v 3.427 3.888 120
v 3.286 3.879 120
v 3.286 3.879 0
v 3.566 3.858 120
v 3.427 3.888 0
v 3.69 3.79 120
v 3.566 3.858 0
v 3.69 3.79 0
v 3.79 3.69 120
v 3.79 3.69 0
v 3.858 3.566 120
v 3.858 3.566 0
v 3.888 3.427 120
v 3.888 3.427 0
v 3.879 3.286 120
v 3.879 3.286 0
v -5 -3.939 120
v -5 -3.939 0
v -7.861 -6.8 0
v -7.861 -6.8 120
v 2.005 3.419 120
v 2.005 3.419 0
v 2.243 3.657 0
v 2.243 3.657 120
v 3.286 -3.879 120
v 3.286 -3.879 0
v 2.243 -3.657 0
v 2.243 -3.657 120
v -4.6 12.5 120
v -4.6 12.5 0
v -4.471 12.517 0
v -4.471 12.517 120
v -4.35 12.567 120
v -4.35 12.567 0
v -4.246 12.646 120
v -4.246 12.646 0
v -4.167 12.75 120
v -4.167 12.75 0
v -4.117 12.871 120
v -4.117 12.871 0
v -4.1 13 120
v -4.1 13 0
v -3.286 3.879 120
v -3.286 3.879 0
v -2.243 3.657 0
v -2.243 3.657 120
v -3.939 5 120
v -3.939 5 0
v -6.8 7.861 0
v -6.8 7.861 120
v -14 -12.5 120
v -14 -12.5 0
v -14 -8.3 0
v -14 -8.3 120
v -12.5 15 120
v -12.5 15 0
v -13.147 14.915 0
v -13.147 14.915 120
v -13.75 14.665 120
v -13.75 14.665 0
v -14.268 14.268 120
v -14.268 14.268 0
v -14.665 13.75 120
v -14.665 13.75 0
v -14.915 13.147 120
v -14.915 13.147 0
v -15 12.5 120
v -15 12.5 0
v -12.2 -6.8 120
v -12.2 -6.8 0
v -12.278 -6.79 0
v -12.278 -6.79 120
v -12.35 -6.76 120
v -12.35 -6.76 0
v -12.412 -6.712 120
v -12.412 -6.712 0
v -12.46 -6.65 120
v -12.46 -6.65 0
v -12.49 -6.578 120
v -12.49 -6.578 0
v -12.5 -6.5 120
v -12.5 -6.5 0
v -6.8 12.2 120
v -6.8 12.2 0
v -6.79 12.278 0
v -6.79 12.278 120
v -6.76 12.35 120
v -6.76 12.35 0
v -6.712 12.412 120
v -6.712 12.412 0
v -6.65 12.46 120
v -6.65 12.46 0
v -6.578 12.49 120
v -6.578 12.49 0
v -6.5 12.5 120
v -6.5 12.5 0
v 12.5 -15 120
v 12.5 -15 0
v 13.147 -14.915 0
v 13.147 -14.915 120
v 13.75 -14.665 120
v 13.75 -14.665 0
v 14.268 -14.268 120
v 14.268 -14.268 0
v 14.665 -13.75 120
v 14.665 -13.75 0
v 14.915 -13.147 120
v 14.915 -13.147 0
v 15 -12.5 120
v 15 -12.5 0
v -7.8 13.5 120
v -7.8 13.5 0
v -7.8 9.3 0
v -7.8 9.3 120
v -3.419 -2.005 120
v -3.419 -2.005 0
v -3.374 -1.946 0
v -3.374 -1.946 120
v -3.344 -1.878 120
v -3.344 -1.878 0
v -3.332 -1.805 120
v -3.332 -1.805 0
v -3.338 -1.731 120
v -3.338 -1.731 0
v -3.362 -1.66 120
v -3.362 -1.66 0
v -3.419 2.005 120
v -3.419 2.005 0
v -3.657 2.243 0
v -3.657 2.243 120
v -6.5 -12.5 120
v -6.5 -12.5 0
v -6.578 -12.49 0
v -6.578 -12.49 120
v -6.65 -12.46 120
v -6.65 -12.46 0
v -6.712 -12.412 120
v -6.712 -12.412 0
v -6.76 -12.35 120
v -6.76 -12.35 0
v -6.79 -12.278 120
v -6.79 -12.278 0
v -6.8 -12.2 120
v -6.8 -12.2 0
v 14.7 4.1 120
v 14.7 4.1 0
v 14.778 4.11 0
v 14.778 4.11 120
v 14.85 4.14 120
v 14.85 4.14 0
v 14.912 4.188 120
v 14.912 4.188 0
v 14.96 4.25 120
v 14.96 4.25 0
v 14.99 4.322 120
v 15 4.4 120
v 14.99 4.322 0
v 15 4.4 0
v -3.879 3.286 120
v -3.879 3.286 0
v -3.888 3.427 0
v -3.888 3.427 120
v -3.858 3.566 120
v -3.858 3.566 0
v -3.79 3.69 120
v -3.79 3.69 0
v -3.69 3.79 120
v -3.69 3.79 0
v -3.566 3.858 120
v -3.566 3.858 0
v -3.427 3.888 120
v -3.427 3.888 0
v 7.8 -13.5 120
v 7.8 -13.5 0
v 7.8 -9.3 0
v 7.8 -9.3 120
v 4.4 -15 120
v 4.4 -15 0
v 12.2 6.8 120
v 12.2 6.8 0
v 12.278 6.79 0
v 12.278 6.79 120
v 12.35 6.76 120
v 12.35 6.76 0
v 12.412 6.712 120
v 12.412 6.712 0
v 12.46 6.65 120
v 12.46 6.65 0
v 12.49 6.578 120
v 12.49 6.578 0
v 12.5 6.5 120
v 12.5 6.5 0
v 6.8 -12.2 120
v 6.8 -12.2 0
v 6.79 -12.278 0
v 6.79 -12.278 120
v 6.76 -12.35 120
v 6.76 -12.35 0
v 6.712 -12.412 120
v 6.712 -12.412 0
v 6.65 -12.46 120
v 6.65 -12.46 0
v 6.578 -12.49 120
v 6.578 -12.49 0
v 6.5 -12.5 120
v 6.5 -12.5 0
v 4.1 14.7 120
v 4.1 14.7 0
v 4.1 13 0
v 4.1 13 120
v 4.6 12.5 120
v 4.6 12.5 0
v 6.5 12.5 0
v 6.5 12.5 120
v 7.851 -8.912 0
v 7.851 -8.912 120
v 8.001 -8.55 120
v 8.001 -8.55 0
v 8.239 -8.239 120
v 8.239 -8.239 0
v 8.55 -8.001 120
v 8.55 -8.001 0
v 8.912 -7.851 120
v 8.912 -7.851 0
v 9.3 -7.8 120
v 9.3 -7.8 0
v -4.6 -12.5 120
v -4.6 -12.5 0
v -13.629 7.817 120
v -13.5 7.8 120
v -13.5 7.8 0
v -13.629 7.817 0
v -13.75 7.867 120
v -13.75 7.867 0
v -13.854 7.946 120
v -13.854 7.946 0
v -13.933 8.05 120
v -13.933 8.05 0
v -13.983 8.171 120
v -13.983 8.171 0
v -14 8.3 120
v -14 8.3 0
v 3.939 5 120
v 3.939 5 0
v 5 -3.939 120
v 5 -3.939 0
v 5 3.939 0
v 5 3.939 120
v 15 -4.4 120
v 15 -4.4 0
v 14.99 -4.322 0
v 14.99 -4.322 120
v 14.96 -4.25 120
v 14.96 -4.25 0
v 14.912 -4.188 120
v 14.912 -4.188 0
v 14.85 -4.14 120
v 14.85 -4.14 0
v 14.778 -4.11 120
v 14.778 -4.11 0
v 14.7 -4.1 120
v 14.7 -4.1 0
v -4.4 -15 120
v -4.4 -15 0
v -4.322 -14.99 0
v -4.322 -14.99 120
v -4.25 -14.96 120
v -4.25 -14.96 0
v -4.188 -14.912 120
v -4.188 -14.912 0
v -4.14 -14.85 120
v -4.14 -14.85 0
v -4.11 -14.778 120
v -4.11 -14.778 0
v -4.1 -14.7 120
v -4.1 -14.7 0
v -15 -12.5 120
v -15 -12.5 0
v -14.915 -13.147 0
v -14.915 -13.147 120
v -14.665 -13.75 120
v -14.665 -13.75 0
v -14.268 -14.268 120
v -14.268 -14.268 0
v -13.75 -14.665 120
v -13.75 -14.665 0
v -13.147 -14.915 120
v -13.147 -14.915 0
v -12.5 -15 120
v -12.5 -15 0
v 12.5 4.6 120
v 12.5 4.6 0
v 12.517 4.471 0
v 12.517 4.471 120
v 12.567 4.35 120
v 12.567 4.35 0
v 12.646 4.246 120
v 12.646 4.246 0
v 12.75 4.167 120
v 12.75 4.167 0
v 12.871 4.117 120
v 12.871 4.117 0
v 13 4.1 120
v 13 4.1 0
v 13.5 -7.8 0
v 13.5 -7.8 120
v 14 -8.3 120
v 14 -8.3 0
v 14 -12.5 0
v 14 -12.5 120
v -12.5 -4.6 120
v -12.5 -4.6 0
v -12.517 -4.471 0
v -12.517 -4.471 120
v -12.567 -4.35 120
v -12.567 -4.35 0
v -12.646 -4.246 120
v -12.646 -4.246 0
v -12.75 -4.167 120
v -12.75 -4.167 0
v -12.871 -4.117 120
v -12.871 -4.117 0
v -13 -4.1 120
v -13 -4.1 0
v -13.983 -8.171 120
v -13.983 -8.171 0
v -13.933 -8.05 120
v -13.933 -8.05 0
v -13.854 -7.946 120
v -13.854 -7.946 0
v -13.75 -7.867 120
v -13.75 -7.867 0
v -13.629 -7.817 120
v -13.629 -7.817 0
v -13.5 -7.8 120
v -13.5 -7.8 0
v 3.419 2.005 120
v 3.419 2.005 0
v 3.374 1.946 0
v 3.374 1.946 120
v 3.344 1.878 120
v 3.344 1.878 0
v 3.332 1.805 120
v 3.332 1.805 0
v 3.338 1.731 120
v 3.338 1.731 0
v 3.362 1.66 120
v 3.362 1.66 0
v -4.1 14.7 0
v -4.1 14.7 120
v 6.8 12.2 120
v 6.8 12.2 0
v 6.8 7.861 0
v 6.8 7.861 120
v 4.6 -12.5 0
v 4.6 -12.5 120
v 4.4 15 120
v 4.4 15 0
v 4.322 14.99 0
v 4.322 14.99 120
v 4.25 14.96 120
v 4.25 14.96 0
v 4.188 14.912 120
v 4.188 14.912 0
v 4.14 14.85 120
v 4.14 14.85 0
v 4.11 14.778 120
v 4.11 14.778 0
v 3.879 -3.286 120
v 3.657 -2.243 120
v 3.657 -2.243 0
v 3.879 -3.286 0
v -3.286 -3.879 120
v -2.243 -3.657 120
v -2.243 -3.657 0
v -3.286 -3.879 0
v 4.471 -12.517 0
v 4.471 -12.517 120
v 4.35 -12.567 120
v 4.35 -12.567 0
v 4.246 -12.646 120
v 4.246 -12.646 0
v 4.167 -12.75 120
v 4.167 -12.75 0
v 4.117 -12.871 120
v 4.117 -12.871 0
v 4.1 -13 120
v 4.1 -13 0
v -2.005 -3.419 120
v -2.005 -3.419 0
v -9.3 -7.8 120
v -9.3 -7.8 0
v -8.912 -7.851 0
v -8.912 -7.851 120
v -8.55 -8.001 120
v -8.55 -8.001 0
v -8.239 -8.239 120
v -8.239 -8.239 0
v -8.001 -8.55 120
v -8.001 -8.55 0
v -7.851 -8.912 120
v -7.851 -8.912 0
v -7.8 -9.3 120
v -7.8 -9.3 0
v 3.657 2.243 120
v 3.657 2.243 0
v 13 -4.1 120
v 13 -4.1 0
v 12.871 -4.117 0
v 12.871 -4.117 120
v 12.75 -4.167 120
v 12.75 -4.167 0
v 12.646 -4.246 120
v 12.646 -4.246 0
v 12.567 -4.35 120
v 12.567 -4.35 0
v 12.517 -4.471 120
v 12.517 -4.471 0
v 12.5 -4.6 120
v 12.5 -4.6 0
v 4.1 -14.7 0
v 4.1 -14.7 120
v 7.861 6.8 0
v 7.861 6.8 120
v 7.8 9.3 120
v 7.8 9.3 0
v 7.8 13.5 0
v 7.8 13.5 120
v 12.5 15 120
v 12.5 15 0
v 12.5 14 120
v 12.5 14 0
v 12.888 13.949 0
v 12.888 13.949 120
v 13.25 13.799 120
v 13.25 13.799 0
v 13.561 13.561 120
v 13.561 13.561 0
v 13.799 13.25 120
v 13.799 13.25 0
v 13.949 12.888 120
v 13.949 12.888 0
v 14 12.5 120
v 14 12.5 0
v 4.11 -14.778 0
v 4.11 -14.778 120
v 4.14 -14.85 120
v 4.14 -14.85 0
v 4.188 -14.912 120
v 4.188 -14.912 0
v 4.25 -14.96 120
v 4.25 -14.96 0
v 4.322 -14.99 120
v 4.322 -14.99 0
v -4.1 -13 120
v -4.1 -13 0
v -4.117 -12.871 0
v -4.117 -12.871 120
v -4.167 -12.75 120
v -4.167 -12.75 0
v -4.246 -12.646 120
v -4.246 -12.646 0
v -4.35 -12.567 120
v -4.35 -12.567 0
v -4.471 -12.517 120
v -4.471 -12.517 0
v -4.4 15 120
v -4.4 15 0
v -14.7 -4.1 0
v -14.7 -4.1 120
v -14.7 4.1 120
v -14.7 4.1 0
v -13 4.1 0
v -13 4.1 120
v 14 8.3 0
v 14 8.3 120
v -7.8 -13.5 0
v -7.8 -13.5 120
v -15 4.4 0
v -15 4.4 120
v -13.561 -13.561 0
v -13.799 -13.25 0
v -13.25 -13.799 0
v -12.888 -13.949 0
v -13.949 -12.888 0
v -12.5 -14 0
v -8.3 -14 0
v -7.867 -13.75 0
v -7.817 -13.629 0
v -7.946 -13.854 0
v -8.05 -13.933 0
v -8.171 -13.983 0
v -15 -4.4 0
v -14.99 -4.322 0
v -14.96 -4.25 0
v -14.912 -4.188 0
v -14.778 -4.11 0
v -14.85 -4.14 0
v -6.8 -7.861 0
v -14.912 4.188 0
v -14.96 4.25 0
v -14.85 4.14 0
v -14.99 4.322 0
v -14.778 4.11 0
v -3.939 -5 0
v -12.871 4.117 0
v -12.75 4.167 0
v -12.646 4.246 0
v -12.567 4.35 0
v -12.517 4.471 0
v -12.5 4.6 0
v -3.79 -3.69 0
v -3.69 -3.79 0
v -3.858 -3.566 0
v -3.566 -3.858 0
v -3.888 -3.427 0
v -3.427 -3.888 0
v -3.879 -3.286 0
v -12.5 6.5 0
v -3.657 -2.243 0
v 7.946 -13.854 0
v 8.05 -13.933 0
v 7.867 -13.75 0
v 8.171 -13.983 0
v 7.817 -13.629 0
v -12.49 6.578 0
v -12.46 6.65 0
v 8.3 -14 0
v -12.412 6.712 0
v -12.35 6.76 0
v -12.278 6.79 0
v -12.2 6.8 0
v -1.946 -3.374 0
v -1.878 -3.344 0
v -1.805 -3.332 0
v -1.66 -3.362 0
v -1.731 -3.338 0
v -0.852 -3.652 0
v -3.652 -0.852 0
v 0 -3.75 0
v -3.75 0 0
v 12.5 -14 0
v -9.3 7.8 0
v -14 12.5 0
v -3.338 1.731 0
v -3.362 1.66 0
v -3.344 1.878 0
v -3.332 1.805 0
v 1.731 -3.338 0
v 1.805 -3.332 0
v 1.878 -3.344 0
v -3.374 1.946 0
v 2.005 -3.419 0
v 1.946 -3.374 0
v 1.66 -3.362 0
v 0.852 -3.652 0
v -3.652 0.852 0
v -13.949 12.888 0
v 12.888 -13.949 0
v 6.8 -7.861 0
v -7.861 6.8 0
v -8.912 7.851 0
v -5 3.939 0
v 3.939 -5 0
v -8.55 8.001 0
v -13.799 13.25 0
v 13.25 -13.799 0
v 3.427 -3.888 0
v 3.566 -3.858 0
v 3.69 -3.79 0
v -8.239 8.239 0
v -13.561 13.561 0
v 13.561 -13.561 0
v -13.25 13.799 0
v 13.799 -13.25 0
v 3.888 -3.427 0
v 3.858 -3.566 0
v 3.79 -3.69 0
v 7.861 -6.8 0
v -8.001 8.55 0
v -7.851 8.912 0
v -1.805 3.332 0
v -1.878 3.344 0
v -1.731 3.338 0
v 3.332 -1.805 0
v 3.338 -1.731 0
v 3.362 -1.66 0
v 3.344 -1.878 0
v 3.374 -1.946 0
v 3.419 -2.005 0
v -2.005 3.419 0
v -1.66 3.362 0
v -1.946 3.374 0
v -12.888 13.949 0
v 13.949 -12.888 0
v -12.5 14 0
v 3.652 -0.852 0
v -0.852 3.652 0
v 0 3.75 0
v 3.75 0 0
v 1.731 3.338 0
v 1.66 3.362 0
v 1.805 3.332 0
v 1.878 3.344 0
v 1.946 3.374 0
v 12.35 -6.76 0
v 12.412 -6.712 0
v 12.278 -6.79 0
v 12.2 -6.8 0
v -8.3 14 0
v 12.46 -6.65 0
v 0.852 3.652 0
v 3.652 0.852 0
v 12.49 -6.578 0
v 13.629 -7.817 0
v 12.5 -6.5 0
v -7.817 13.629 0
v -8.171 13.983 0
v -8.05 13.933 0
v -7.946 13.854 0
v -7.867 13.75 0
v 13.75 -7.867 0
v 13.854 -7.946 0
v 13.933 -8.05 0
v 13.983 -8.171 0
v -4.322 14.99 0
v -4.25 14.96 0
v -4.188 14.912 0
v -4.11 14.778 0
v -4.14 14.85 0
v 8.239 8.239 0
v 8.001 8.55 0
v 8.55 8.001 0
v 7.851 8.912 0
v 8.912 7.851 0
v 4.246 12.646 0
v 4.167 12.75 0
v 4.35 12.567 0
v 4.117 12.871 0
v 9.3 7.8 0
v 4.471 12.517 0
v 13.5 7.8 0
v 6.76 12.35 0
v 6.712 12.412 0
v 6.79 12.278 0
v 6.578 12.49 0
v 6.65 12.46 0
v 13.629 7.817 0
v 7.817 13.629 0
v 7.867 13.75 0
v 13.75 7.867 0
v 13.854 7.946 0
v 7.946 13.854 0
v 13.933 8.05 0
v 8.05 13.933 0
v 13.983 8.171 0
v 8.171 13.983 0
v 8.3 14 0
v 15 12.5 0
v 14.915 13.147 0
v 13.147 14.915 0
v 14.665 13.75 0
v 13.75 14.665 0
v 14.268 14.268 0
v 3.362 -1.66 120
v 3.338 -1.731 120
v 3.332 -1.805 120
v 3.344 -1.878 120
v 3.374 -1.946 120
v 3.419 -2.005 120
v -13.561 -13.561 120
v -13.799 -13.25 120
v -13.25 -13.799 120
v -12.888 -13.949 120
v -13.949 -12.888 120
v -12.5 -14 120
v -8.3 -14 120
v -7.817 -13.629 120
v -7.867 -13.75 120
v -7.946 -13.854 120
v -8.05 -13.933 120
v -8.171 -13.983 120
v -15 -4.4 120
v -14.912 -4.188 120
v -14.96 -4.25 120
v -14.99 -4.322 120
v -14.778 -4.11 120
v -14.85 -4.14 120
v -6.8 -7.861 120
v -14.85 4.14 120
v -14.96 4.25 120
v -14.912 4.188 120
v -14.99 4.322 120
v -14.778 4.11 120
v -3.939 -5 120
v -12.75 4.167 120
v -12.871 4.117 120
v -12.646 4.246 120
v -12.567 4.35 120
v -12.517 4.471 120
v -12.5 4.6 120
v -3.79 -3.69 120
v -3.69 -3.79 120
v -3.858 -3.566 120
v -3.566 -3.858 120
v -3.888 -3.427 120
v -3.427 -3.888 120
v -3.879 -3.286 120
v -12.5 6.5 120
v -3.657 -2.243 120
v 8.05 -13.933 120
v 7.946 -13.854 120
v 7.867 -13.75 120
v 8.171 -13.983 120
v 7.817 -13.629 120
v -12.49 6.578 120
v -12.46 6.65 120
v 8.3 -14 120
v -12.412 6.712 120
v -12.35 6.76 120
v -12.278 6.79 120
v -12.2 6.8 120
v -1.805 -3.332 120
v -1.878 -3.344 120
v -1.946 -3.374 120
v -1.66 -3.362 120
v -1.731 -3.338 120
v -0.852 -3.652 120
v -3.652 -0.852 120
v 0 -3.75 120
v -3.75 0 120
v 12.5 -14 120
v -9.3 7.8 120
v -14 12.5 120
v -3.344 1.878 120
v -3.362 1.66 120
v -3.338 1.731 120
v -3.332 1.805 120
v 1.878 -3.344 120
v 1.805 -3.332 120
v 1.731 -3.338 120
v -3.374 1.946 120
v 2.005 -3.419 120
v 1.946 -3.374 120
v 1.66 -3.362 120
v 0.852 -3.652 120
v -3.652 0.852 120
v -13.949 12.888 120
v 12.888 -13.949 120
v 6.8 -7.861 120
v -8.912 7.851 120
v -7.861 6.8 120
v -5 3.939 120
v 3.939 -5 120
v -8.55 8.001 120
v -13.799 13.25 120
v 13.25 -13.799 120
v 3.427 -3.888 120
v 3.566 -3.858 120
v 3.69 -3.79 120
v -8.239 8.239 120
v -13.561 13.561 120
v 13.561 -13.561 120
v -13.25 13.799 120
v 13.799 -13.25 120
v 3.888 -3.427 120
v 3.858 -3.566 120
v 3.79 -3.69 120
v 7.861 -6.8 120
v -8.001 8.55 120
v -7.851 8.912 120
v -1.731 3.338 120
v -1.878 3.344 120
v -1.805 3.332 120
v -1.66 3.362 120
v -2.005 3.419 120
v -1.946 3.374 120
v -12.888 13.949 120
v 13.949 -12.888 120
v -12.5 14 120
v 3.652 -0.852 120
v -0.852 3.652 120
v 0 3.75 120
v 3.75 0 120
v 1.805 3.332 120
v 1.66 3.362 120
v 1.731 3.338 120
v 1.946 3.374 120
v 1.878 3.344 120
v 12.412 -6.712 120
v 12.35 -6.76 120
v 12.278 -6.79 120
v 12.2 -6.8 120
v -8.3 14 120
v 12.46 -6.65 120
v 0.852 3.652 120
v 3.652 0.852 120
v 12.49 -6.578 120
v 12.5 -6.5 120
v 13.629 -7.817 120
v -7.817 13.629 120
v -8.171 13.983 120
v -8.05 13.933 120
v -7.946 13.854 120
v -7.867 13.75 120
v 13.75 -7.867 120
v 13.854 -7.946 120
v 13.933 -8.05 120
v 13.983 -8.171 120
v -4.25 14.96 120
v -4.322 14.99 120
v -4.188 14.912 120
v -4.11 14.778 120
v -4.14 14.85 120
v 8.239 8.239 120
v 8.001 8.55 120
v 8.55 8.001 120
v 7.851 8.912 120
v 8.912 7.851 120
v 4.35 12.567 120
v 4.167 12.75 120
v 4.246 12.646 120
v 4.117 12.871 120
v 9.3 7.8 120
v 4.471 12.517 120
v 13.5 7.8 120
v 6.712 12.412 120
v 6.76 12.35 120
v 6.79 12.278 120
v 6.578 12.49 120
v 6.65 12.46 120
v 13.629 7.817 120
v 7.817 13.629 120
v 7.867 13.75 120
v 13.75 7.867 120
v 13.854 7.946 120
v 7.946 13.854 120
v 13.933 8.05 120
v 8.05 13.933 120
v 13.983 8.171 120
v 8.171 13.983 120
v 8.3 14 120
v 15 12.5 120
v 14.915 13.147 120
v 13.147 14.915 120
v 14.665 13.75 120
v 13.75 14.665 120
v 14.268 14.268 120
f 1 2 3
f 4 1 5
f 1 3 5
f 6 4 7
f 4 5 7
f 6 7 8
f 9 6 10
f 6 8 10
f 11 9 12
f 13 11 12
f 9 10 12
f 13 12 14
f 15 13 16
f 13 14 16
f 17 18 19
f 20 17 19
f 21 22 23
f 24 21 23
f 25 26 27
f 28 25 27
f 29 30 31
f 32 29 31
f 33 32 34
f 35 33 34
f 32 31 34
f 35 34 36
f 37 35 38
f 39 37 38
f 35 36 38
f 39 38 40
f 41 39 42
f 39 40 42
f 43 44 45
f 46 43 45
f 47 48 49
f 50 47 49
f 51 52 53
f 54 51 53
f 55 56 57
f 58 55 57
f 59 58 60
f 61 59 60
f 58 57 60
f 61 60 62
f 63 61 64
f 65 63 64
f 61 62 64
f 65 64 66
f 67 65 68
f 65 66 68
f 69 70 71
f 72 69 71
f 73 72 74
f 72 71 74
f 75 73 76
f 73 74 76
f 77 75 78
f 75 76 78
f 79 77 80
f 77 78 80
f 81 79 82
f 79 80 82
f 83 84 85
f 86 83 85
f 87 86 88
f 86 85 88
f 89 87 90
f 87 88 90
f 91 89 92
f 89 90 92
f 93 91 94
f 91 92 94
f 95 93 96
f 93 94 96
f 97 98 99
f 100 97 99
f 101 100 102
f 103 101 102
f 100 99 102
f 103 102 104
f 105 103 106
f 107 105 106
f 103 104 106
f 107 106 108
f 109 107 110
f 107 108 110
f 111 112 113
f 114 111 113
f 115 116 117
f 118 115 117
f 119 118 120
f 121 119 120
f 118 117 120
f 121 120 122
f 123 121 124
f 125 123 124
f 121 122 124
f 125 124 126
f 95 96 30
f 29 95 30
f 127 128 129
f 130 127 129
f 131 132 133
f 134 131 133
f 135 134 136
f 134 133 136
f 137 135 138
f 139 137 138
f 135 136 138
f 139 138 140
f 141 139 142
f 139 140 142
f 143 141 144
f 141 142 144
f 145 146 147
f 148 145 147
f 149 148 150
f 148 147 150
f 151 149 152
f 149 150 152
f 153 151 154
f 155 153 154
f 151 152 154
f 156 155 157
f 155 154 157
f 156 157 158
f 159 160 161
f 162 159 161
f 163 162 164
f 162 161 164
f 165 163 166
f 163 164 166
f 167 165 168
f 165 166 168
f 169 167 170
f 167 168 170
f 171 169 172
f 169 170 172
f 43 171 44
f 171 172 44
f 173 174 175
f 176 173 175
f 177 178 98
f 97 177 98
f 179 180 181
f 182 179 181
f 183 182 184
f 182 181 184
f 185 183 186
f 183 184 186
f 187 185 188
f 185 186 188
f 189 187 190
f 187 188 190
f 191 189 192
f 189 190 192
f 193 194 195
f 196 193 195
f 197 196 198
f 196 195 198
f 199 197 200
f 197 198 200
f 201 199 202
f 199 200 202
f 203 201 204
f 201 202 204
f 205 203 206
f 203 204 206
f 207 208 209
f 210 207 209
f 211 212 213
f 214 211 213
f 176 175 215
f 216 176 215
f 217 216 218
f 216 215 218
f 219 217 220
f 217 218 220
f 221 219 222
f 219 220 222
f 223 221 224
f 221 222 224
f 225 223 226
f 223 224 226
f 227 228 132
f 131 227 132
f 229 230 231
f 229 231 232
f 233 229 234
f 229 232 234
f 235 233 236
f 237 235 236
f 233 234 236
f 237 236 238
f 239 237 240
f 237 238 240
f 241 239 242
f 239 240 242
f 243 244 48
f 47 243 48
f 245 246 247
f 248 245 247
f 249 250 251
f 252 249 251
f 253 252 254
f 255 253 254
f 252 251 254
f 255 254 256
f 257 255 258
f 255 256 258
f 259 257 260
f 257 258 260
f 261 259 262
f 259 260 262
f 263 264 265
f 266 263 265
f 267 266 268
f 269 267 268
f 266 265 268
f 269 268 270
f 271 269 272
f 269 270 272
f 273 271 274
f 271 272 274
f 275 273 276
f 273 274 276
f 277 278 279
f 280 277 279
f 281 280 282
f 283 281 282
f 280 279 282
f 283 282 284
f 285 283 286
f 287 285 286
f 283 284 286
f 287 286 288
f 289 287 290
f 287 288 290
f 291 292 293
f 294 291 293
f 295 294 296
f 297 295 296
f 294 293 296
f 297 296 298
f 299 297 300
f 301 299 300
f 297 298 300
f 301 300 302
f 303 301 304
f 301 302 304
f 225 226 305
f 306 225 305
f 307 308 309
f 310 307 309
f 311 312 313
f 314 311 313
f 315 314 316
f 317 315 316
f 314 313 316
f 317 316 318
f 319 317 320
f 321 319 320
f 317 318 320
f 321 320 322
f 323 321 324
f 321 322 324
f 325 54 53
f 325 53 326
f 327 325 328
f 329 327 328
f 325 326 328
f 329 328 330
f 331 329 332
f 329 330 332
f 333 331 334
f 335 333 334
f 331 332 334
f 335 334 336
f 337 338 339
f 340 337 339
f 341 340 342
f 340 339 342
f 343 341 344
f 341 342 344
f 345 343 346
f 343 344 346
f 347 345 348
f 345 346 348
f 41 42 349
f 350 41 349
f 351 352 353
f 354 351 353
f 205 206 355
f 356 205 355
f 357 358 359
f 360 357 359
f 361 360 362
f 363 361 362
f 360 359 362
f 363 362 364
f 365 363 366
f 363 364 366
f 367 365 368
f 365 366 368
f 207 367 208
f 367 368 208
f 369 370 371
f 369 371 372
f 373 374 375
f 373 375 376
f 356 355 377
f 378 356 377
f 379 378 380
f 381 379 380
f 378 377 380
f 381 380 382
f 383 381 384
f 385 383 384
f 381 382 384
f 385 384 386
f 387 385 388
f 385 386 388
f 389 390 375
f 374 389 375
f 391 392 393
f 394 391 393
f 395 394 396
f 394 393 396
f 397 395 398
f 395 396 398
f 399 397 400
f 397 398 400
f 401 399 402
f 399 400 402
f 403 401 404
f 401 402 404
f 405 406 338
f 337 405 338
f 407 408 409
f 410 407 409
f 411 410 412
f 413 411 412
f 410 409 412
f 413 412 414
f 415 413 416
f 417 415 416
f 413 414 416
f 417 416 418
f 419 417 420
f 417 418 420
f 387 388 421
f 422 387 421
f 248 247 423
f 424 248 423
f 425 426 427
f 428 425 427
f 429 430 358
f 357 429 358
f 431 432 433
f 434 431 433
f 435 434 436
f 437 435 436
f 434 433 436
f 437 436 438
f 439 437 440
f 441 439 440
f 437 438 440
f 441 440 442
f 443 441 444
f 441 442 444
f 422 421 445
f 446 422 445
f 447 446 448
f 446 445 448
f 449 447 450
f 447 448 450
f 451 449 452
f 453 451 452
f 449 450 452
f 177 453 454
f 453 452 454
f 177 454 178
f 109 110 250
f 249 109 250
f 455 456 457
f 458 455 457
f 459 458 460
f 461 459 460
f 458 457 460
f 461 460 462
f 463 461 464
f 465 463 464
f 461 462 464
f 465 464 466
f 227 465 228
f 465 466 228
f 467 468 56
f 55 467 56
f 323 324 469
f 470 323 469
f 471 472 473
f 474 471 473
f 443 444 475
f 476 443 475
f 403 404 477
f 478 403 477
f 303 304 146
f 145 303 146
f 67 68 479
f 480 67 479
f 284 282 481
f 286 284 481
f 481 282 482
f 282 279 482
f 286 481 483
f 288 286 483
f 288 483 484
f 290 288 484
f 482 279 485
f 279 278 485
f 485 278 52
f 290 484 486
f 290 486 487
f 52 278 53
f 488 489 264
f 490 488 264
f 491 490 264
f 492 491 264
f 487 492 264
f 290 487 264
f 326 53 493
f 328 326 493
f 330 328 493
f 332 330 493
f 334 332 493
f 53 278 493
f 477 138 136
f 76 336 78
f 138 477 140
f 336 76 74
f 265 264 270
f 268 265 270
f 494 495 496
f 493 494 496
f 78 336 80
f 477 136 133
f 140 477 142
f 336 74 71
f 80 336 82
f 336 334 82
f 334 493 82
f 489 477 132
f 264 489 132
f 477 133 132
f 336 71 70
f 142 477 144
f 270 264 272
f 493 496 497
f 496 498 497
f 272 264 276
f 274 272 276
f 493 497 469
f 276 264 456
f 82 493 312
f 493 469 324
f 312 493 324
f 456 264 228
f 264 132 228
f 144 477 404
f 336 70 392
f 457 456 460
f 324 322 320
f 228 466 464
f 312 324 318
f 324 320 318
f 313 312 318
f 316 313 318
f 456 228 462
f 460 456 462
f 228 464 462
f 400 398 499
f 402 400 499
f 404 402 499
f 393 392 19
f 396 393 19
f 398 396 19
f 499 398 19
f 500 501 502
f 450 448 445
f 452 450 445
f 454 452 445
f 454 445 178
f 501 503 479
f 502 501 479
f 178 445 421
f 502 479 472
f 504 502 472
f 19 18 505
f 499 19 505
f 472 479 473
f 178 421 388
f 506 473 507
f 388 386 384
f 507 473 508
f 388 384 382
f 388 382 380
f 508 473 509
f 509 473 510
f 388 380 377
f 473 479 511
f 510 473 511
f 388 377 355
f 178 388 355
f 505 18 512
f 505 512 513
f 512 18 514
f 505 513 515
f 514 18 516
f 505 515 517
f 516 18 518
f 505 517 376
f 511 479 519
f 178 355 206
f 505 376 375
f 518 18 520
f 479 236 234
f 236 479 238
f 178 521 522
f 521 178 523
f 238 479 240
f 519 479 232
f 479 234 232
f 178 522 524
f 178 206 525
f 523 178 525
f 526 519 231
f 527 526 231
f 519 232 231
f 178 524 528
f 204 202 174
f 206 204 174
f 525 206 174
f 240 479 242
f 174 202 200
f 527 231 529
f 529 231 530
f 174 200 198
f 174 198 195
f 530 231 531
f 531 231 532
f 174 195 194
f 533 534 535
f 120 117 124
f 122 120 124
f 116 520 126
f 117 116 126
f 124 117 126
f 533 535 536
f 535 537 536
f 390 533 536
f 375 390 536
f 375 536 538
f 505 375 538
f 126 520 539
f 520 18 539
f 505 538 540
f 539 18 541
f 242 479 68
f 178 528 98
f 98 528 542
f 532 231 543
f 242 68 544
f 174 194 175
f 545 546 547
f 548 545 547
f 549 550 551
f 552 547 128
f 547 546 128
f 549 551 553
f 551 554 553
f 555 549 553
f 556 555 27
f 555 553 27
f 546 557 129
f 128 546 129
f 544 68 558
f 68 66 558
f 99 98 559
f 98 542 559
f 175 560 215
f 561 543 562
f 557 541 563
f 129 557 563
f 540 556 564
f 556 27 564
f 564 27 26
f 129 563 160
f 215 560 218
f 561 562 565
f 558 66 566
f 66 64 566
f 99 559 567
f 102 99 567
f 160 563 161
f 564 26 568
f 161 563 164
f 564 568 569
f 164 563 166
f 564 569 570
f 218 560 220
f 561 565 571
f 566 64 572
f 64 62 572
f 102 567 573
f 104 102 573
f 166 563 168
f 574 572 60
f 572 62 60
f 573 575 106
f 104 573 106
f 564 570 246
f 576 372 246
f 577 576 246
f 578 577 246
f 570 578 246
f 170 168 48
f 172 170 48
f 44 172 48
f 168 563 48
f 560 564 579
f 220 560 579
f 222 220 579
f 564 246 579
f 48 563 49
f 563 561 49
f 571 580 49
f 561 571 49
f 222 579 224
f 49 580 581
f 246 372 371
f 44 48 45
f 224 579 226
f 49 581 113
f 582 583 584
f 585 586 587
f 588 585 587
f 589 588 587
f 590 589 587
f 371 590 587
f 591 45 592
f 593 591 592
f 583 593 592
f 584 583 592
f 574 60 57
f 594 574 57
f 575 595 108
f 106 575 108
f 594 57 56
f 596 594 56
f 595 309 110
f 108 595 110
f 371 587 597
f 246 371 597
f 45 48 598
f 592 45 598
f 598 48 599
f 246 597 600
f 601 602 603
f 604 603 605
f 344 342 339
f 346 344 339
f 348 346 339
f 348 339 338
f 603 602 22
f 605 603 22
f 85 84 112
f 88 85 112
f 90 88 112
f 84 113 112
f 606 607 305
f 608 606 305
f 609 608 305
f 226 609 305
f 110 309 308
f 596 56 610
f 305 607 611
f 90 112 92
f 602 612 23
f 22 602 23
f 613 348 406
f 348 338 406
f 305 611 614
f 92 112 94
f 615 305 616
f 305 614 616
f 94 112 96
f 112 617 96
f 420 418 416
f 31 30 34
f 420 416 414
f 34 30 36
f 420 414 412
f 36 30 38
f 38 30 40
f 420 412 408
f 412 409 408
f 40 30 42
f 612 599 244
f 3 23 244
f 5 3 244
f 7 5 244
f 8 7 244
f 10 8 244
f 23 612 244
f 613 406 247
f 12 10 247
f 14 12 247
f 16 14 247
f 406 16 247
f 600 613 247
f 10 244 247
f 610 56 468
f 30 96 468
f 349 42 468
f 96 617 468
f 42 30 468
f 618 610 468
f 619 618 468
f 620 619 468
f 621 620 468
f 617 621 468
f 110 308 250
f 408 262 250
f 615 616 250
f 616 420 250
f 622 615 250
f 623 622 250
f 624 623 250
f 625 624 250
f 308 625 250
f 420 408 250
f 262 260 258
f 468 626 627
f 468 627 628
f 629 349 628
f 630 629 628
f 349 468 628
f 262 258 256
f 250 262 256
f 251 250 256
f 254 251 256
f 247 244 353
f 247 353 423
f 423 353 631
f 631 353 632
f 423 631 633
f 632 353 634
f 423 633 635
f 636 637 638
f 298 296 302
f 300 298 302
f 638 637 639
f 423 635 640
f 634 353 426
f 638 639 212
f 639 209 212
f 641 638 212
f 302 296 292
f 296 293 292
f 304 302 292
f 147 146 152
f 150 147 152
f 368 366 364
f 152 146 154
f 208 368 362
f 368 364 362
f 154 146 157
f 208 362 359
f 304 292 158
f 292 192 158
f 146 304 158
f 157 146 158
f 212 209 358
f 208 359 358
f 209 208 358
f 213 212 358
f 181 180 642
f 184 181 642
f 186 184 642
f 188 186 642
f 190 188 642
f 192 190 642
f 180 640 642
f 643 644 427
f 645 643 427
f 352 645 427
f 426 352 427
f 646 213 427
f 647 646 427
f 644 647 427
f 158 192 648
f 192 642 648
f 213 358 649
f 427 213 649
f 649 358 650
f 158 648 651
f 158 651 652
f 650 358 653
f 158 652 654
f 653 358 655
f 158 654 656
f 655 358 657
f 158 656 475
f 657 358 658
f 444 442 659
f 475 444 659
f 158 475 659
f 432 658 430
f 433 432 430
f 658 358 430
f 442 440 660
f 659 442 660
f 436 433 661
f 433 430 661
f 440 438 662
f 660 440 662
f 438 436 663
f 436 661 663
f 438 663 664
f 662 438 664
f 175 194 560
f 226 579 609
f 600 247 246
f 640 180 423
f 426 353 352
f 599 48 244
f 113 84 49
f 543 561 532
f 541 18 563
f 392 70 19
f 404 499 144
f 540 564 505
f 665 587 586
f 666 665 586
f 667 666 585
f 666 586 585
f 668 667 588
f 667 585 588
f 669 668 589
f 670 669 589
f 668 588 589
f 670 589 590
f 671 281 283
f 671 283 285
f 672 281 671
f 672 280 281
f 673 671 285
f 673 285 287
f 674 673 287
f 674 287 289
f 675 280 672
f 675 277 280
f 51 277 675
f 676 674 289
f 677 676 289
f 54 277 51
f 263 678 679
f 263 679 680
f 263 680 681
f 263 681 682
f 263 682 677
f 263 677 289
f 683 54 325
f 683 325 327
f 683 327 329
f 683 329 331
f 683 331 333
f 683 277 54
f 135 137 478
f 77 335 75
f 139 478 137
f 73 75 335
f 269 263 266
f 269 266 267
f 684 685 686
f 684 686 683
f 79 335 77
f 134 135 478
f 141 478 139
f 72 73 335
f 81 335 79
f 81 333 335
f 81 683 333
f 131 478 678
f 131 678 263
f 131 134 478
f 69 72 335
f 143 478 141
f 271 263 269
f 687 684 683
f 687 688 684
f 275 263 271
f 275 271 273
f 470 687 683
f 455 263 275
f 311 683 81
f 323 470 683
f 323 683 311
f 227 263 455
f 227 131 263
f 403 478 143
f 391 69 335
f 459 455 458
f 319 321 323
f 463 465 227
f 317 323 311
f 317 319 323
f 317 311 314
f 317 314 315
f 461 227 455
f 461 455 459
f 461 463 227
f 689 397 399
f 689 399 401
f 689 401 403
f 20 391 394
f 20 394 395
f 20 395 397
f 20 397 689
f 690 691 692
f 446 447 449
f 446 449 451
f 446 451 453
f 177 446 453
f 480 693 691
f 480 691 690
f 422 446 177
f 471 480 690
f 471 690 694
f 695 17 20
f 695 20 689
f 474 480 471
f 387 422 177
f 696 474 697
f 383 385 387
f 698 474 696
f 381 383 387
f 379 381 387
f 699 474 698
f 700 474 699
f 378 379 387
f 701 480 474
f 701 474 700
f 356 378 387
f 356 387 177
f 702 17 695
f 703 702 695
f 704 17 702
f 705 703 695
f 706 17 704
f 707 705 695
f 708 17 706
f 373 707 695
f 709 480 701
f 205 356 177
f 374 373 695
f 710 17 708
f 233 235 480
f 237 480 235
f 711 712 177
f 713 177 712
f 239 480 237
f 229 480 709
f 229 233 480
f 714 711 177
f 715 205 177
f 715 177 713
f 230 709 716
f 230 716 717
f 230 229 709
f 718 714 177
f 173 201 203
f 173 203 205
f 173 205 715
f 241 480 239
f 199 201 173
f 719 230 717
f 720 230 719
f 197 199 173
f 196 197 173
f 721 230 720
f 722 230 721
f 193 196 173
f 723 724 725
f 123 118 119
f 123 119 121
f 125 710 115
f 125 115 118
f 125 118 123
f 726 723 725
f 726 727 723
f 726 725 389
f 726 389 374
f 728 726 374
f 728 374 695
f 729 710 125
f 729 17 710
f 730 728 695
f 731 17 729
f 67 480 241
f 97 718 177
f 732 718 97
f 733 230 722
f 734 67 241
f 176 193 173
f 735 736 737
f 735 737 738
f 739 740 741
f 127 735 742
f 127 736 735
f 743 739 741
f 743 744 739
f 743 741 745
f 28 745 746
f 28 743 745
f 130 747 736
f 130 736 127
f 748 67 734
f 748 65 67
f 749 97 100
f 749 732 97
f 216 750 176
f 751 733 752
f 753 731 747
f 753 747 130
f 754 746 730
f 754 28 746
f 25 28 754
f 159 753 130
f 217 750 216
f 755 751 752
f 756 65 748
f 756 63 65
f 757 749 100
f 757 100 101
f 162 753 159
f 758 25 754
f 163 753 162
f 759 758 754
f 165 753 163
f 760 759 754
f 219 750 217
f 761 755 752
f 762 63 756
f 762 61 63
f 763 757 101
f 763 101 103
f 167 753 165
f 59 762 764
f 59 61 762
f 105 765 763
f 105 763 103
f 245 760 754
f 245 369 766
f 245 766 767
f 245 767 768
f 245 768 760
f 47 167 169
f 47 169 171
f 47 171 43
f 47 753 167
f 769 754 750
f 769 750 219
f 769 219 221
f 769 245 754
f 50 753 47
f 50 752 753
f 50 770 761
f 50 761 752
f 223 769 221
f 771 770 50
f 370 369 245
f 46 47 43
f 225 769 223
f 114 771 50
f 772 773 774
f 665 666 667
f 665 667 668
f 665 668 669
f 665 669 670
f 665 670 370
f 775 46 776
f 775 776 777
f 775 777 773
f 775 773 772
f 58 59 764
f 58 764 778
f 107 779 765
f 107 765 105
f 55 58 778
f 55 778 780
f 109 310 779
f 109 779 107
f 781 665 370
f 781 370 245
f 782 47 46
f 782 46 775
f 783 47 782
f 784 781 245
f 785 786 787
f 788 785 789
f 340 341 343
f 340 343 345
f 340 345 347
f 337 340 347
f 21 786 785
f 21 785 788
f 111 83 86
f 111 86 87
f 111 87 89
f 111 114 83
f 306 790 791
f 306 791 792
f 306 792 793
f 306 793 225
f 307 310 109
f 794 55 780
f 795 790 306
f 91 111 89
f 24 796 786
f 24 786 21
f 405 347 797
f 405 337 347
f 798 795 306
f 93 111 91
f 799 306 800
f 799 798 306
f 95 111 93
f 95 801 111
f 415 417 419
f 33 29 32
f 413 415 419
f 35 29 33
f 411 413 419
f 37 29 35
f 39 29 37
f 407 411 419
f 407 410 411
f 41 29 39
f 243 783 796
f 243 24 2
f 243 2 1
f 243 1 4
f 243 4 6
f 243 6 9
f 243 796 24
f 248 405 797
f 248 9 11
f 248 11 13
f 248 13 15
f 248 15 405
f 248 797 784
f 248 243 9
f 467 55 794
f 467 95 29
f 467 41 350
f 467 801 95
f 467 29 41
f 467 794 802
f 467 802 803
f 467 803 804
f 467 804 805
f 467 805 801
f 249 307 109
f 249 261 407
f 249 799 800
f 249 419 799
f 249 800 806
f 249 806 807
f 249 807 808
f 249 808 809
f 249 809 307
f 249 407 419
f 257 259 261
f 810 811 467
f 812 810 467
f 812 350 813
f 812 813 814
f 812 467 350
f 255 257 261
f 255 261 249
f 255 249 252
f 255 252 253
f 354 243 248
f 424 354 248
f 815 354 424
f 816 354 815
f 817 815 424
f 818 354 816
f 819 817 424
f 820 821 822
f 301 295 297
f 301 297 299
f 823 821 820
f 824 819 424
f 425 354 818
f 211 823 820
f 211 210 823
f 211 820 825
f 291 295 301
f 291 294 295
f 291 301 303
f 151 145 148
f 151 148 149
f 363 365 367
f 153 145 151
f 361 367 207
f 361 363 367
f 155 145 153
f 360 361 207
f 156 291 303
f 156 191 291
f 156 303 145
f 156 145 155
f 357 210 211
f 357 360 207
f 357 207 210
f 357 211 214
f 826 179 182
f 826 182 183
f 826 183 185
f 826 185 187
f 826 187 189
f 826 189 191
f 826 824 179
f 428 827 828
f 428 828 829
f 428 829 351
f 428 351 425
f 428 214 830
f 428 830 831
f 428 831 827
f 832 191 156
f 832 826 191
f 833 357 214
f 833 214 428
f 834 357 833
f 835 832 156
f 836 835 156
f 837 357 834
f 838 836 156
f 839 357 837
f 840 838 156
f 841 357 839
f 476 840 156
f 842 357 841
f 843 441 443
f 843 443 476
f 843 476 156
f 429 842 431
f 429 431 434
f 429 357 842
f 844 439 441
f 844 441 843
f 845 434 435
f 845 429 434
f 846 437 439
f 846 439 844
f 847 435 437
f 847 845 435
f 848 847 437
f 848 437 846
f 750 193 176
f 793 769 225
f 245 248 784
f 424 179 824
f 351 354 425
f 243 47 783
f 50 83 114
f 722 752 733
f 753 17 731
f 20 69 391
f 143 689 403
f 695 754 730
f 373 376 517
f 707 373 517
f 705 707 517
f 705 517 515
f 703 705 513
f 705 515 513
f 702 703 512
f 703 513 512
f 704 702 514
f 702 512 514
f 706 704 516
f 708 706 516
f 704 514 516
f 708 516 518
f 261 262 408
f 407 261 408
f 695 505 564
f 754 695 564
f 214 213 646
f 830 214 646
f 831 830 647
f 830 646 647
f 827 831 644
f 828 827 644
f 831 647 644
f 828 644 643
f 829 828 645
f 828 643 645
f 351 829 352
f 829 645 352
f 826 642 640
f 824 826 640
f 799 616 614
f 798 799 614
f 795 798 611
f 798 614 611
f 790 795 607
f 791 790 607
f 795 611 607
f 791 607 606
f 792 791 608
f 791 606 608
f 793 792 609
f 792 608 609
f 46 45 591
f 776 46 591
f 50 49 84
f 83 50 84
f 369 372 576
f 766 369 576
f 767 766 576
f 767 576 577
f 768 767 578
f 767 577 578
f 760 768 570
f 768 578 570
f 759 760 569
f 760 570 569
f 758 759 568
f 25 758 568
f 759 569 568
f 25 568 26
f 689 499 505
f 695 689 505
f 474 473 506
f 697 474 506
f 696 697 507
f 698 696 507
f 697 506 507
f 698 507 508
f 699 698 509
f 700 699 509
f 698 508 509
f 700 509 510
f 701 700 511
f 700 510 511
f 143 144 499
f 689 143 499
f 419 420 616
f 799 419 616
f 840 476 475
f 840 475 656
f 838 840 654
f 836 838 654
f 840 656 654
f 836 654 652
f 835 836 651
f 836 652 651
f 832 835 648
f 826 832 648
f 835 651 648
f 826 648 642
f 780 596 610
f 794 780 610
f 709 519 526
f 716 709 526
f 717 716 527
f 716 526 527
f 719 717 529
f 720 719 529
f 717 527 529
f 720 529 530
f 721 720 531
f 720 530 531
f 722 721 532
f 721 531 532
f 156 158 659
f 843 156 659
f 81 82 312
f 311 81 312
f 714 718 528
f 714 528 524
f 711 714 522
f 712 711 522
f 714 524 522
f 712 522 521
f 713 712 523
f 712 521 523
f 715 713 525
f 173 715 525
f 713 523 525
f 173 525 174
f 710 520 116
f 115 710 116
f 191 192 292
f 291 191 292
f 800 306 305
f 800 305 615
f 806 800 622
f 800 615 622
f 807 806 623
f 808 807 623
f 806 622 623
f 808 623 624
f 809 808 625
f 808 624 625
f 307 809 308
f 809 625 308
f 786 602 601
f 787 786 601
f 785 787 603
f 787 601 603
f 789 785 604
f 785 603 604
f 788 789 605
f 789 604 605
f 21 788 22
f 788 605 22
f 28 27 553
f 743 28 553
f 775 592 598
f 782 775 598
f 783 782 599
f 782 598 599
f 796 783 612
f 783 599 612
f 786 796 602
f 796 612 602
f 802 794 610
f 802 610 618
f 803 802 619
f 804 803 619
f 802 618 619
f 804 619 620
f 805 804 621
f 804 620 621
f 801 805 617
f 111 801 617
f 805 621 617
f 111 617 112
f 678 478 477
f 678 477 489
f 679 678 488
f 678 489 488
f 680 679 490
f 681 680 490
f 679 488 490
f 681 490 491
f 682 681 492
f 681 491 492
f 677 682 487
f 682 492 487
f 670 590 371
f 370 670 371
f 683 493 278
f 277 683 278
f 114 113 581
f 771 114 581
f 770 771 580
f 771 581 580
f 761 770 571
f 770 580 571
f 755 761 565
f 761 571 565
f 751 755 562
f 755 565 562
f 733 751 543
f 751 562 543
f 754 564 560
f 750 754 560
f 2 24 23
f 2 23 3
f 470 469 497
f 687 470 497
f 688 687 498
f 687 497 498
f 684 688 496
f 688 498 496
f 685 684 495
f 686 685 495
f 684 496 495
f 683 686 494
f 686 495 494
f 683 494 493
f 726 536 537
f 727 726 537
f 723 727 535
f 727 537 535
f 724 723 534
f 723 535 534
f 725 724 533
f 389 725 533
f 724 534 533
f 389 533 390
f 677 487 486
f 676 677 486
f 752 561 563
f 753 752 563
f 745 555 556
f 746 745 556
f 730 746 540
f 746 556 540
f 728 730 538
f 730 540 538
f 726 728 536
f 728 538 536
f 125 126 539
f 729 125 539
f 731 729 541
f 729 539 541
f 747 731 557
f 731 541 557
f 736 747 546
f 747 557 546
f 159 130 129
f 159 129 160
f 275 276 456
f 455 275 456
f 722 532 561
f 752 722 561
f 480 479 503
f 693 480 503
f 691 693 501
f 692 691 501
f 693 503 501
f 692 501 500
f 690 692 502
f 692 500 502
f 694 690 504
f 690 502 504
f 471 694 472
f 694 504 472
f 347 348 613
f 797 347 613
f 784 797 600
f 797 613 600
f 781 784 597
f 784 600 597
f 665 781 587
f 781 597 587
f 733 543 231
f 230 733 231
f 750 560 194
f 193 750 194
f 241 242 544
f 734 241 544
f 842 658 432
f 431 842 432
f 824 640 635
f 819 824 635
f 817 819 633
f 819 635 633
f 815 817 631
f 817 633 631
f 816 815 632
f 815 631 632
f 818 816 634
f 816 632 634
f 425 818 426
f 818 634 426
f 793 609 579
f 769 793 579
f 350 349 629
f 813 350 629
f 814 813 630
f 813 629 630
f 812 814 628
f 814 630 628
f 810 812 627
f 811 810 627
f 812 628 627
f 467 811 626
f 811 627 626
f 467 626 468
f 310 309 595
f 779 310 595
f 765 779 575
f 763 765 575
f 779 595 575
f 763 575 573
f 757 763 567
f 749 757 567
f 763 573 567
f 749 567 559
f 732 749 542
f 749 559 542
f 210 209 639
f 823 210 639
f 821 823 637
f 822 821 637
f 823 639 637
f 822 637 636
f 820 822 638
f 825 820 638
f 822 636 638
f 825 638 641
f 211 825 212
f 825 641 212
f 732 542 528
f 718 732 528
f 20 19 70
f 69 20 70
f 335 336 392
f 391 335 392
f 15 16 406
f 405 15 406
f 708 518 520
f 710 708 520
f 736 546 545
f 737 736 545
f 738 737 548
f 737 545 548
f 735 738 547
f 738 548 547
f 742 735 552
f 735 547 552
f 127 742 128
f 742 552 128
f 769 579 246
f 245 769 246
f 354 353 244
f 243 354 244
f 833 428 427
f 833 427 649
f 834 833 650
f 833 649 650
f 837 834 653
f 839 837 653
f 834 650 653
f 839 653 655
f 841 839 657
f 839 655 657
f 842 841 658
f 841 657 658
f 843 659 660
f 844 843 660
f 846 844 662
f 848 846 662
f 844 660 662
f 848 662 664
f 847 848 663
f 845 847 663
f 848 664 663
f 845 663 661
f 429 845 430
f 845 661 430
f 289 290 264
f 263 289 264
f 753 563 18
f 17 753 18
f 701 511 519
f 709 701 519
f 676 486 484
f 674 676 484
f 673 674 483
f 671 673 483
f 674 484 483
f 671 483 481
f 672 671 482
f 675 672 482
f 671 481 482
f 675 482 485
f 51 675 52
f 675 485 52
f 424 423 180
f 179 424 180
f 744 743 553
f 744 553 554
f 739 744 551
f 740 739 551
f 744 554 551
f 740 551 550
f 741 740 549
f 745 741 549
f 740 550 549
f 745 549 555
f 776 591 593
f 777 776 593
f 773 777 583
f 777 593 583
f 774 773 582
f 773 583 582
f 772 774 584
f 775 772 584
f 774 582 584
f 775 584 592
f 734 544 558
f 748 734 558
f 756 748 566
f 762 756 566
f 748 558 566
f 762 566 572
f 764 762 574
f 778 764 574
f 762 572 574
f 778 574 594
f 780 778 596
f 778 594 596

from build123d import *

# Parameters (mm, degrees)
F1_DEPTH = 120


# Not quite as in the source:
# - ends of sketch curves that miss each other by under 0.0002 mm in the source are joined
# - the program builds the solid bodies; features that only make, move or delete a surface that nothing else refers to are left out


with BuildPart() as f1:
    # F0 (on Top) → F1 (new body)
    with BuildSketch(Plane.XY):
        with BuildLine():
            Line((3.939341, -5), (6.799995, -7.860656))
            Line((6.799995, -7.860656), (6.799995, -12.199997))
            ThreePointArc((6.799995, -12.199997), (6.7121307415, -12.4121300846), (6.5, -12.5))
            Line((6.5, -12.5), (4.599998, -12.5))
            ThreePointArc((4.599998, -12.5), (4.2464446094, -12.6464466094), (4.099998, -13))
            Line((4.099998, -13), (4.099998, -14.699997))
            ThreePointArc((4.099998, -14.699997), (4.1878632585, -14.9121300846), (4.399994, -15))
            Line((4.399994, -15), (12.5, -15))
            ThreePointArc((12.5, -15), (14.267766953, -14.267766953), (15, -12.5))
            Line((15, -12.5), (15, -4.399994))
            ThreePointArc((15, -4.399994), (14.9121300846, -4.1878632585), (14.699997, -4.099999))
            Line((14.699997, -4.099999), (13, -4.099998))
            ThreePointArc((13, -4.099998), (12.6464466094, -4.2464446094), (12.5, -4.599998))
            Line((12.5, -4.599998), (12.5, -6.5))
            ThreePointArc((12.5, -6.5), (12.4121300846, -6.7121307415), (12.199997, -6.799995))
            Line((12.199997, -6.799995), (7.860655, -6.799995))
            Line((7.860655, -6.799995), (5, -3.93934))
            Line((5, -3.93934), (5, 3.939341))
            Line((5, 3.939341), (7.860655, 6.799995))
            Line((7.860655, 6.799995), (12.199997, 6.799995))
            ThreePointArc((12.199997, 6.799995), (12.4121300846, 6.7121307415), (12.5, 6.5))
            Line((12.5, 6.5), (12.5, 4.599998))
            ThreePointArc((12.5, 4.599998), (12.6464466094, 4.2464446094), (13, 4.099998))
            Line((13, 4.099998), (14.699997, 4.099998))
            ThreePointArc((14.699997, 4.099998), (14.9121300846, 4.1878632585), (15, 4.399994))
            Line((15, 4.399994), (15, 12.5))
            ThreePointArc((15, 12.5), (14.267766953, 14.267766953), (12.5, 15))
            Line((12.5, 15), (4.399994, 15))
            ThreePointArc((4.399994, 15), (4.1878632585, 14.9121300846), (4.099999, 14.699997))
            Line((4.099999, 14.699997), (4.099998, 13))
            ThreePointArc((4.099998, 13), (4.2464446094, 12.6464466094), (4.599998, 12.5))
            Line((4.599998, 12.5), (6.5, 12.5))
            ThreePointArc((6.5, 12.5), (6.7121307415, 12.4121300846), (6.799995, 12.199997))
            Line((6.799995, 12.199997), (6.799995, 7.860655))
            Line((6.799995, 7.860655), (3.939341, 5))
            Line((3.939341, 5), (-3.93934, 5))
            Line((-3.93934, 5), (-6.799995, 7.860655))
            Line((-6.799995, 7.860655), (-6.799995, 12.199997))
            ThreePointArc((-6.799995, 12.199997), (-6.7121307415, 12.4121300846), (-6.5, 12.5))
            Line((-6.5, 12.5), (-4.599998, 12.5))
            ThreePointArc((-4.599998, 12.5), (-4.2464446094, 12.6464466094), (-4.099998, 13))
            Line((-4.099998, 13), (-4.099998, 14.699997))
            ThreePointArc((-4.099998, 14.699997), (-4.1878632585, 14.9121300846), (-4.399994, 15))
            Line((-4.399994, 15), (-12.5, 15))
            ThreePointArc((-12.5, 15), (-14.267766953, 14.267766953), (-15, 12.5))
            Line((-15, 12.5), (-15, 4.399994))
            ThreePointArc((-15, 4.399994), (-14.9121300846, 4.1878632585), (-14.699997, 4.099999))
            Line((-14.699997, 4.099999), (-13, 4.099998))
            ThreePointArc((-13, 4.099998), (-12.6464466094, 4.2464446094), (-12.5, 4.599998))
            Line((-12.5, 4.599998), (-12.5, 6.5))
            ThreePointArc((-12.5, 6.5), (-12.4121300846, 6.7121307415), (-12.199997, 6.799995))
            Line((-12.199997, 6.799995), (-7.860656, 6.799995))
            Line((-7.860656, 6.799995), (-5, 3.939341))
            Line((-5, 3.939341), (-5, -3.93934))
            Line((-5, -3.93934), (-7.860656, -6.799995))
            Line((-7.860656, -6.799995), (-12.199997, -6.799995))
            ThreePointArc((-12.199997, -6.799995), (-12.4121300846, -6.7121307415), (-12.5, -6.5))
            Line((-12.5, -6.5), (-12.5, -4.599998))
            ThreePointArc((-12.5, -4.599998), (-12.6464466094, -4.2464446094), (-13, -4.099998))
            Line((-13, -4.099998), (-14.699997, -4.099998))
            ThreePointArc((-14.699997, -4.099998), (-14.9121300846, -4.1878632585), (-15, -4.399994))
            Line((-15, -4.399994), (-15, -12.5))
            ThreePointArc((-15, -12.5), (-14.267766953, -14.267766953), (-12.5, -15))
            Line((-12.5, -15), (-4.399994, -15))
            ThreePointArc((-4.399994, -15), (-4.1878632585, -14.9121300846), (-4.099999, -14.699997))
            Line((-4.099999, -14.699997), (-4.099998, -13))
            ThreePointArc((-4.099998, -13), (-4.2464446094, -12.6464466094), (-4.599998, -12.5))
            Line((-4.599998, -12.5), (-6.5, -12.5))
            ThreePointArc((-6.5, -12.5), (-6.7121307415, -12.4121300846), (-6.799995, -12.199997))
            Line((-6.799995, -12.199997), (-6.799995, -7.860656))
            Line((-6.799995, -7.860656), (-3.93934, -5))
            Line((-3.93934, -5), (3.939341, -5))
        make_face()
        with BuildLine():
            Line((-8.299995, -14), (-12.5, -14))
            ThreePointArc((-12.5, -14), (-13.5606601718, -13.5606601718), (-14, -12.5))
            Line((-14, -12.5), (-14, -8.299995))
            ThreePointArc((-14, -8.299995), (-13.8535533906, -7.9464416094), (-13.5, -7.799995))
            Line((-13.5, -7.799995), (-9.299995, -7.799995))
            ThreePointArc((-9.299995, -7.799995), (-8.2393348282, -8.2393348282), (-7.799995, -9.299995))
            Line((-7.799995, -9.299995), (-7.799995, -13.5))
            ThreePointArc((-7.799995, -13.5), (-7.9464416094, -13.8535533906), (-8.299995, -14))
        make_face(mode=Mode.SUBTRACT)
        with BuildLine():
            Line((12.5, -14), (8.299995, -14))
            ThreePointArc((8.299995, -14), (7.9464416094, -13.8535533906), (7.799995, -13.5))
            Line((7.799995, -13.5), (7.799995, -9.299995))
            ThreePointArc((7.799995, -9.299995), (8.2393348282, -8.2393348282), (9.299995, -7.799995))
            Line((9.299995, -7.799995), (13.5, -7.799995))
            ThreePointArc((13.5, -7.799995), (13.8535533906, -7.9464416094), (14, -8.299995))
            Line((14, -8.299995), (14, -12.5))
            ThreePointArc((14, -12.5), (13.5606601718, -13.5606601718), (12.5, -14))
        make_face(mode=Mode.SUBTRACT)
        with BuildLine():
            Line((3.657288, -2.243073), (3.878887, -3.285876))
            ThreePointArc((3.878887, -3.285876), (3.7433613906, -3.7433613906), (3.2858769836, -3.8788870773))
            Line((3.2858769836, -3.8788870773), (2.243074, -3.657287))
            Line((2.243074, -3.657287), (2.005135, -3.419348))
            ThreePointArc((2.005135, -3.419348), (1.841799908, -3.3354753308), (1.6601868142, -3.3624816237))
            ThreePointArc((1.6601868142, -3.3624816237), (0, -3.75), (-1.6601870383, -3.3624810777))
            ThreePointArc((-1.6601870383, -3.3624810777), (-1.841799908, -3.3354753308), (-2.0051340344, -3.4193479656))
            Line((-2.0051340344, -3.4193479656), (-2.243073, -3.657287))
            Line((-2.243073, -3.657287), (-3.285876, -3.878887))
            ThreePointArc((-3.285876, -3.878887), (-3.7433613906, -3.7433613906), (-3.8788870773, -3.2858769836))
            Line((-3.8788870773, -3.2858769836), (-3.657287, -2.243073))
            Line((-3.657287, -2.243073), (-3.419348, -2.005134))
            ThreePointArc((-3.419348, -2.005134), (-3.3354753308, -1.841799908), (-3.3624816237, -1.6601868142))
            ThreePointArc((-3.3624816237, -1.6601868142), (-3.75, 0), (-3.3624810777, 1.6601870383))
            ThreePointArc((-3.3624810777, 1.6601870383), (-3.3354753883, 1.8418002569), (-3.4193484656, 2.0051345344))
            Line((-3.4193484656, 2.0051345344), (-3.657287, 2.243074))
            Line((-3.657287, 2.243074), (-3.878887, 3.285877))
            ThreePointArc((-3.878887, 3.285877), (-3.7433613906, 3.7433613906), (-3.2858769836, 3.8788870773))
            Line((-3.2858769836, 3.8788870773), (-2.243073, 3.657288))
            Line((-2.243073, 3.657288), (-2.005134, 3.419348))
            ThreePointArc((-2.005134, 3.419348), (-1.8418001264, 3.3354753668), (-1.6601872112, 3.3624814277))
            ThreePointArc((-1.6601872112, 3.3624814277), (0, 3.75), (1.6601870383, 3.3624810777))
            ThreePointArc((1.6601870383, 3.3624810777), (1.8418002569, 3.3354753883), (2.0051345344, 3.4193484656))
            Line((2.0051345344, 3.4193484656), (2.243074, 3.657288))
            Line((2.243074, 3.657288), (3.285877, 3.878887))
            ThreePointArc((3.285877, 3.878887), (3.7433610448, 3.7433617364), (3.8788872806, 3.2858779404))
            Line((3.8788872806, 3.2858779404), (3.657288, 2.243074))
            Line((3.657288, 2.243074), (3.419348, 2.005135))
            ThreePointArc((3.419348, 2.005135), (3.3354753668, 1.8418001264), (3.3624814277, 1.6601872112))
            ThreePointArc((3.3624814277, 1.6601872112), (3.75, 0), (3.3624810777, -1.6601870383))
            ThreePointArc((3.3624810777, -1.6601870383), (3.3354753308, -1.841799908), (3.4193479656, -2.0051340344))
            Line((3.4193479656, -2.0051340344), (3.657288, -2.243073))
        make_face(mode=Mode.SUBTRACT)
        with BuildLine():
            Line((-9.299995, 7.799995), (-13.5, 7.799995))
            ThreePointArc((-13.5, 7.799995), (-13.8535533906, 7.9464416094), (-14, 8.299995))
            Line((-14, 8.299995), (-14, 12.5))
            ThreePointArc((-14, 12.5), (-13.5606601718, 13.5606601718), (-12.5, 14))
            Line((-12.5, 14), (-8.299995, 14))
            ThreePointArc((-8.299995, 14), (-7.9464416094, 13.8535533906), (-7.799995, 13.5))
            Line((-7.799995, 13.5), (-7.799995, 9.299995))
            ThreePointArc((-7.799995, 9.299995), (-8.2393348282, 8.2393348282), (-9.299995, 7.799995))
        make_face(mode=Mode.SUBTRACT)
        with BuildLine():
            Line((13.5, 7.799995), (9.299995, 7.799995))
            ThreePointArc((9.299995, 7.799995), (8.2393348282, 8.2393348282), (7.799995, 9.299995))
            Line((7.799995, 9.299995), (7.799995, 13.5))
            ThreePointArc((7.799995, 13.5), (7.9464416094, 13.8535533906), (8.299995, 14))
            Line((8.299995, 14), (12.5, 14))
            ThreePointArc((12.5, 14), (13.5606601718, 13.5606601718), (14, 12.5))
            Line((14, 12.5), (14, 8.299995))
            ThreePointArc((14, 8.299995), (13.8535533906, 7.9464416094), (13.5, 7.799995))
        make_face(mode=Mode.SUBTRACT)
    extrude(amount=F1_DEPTH)


solid = f1.part
